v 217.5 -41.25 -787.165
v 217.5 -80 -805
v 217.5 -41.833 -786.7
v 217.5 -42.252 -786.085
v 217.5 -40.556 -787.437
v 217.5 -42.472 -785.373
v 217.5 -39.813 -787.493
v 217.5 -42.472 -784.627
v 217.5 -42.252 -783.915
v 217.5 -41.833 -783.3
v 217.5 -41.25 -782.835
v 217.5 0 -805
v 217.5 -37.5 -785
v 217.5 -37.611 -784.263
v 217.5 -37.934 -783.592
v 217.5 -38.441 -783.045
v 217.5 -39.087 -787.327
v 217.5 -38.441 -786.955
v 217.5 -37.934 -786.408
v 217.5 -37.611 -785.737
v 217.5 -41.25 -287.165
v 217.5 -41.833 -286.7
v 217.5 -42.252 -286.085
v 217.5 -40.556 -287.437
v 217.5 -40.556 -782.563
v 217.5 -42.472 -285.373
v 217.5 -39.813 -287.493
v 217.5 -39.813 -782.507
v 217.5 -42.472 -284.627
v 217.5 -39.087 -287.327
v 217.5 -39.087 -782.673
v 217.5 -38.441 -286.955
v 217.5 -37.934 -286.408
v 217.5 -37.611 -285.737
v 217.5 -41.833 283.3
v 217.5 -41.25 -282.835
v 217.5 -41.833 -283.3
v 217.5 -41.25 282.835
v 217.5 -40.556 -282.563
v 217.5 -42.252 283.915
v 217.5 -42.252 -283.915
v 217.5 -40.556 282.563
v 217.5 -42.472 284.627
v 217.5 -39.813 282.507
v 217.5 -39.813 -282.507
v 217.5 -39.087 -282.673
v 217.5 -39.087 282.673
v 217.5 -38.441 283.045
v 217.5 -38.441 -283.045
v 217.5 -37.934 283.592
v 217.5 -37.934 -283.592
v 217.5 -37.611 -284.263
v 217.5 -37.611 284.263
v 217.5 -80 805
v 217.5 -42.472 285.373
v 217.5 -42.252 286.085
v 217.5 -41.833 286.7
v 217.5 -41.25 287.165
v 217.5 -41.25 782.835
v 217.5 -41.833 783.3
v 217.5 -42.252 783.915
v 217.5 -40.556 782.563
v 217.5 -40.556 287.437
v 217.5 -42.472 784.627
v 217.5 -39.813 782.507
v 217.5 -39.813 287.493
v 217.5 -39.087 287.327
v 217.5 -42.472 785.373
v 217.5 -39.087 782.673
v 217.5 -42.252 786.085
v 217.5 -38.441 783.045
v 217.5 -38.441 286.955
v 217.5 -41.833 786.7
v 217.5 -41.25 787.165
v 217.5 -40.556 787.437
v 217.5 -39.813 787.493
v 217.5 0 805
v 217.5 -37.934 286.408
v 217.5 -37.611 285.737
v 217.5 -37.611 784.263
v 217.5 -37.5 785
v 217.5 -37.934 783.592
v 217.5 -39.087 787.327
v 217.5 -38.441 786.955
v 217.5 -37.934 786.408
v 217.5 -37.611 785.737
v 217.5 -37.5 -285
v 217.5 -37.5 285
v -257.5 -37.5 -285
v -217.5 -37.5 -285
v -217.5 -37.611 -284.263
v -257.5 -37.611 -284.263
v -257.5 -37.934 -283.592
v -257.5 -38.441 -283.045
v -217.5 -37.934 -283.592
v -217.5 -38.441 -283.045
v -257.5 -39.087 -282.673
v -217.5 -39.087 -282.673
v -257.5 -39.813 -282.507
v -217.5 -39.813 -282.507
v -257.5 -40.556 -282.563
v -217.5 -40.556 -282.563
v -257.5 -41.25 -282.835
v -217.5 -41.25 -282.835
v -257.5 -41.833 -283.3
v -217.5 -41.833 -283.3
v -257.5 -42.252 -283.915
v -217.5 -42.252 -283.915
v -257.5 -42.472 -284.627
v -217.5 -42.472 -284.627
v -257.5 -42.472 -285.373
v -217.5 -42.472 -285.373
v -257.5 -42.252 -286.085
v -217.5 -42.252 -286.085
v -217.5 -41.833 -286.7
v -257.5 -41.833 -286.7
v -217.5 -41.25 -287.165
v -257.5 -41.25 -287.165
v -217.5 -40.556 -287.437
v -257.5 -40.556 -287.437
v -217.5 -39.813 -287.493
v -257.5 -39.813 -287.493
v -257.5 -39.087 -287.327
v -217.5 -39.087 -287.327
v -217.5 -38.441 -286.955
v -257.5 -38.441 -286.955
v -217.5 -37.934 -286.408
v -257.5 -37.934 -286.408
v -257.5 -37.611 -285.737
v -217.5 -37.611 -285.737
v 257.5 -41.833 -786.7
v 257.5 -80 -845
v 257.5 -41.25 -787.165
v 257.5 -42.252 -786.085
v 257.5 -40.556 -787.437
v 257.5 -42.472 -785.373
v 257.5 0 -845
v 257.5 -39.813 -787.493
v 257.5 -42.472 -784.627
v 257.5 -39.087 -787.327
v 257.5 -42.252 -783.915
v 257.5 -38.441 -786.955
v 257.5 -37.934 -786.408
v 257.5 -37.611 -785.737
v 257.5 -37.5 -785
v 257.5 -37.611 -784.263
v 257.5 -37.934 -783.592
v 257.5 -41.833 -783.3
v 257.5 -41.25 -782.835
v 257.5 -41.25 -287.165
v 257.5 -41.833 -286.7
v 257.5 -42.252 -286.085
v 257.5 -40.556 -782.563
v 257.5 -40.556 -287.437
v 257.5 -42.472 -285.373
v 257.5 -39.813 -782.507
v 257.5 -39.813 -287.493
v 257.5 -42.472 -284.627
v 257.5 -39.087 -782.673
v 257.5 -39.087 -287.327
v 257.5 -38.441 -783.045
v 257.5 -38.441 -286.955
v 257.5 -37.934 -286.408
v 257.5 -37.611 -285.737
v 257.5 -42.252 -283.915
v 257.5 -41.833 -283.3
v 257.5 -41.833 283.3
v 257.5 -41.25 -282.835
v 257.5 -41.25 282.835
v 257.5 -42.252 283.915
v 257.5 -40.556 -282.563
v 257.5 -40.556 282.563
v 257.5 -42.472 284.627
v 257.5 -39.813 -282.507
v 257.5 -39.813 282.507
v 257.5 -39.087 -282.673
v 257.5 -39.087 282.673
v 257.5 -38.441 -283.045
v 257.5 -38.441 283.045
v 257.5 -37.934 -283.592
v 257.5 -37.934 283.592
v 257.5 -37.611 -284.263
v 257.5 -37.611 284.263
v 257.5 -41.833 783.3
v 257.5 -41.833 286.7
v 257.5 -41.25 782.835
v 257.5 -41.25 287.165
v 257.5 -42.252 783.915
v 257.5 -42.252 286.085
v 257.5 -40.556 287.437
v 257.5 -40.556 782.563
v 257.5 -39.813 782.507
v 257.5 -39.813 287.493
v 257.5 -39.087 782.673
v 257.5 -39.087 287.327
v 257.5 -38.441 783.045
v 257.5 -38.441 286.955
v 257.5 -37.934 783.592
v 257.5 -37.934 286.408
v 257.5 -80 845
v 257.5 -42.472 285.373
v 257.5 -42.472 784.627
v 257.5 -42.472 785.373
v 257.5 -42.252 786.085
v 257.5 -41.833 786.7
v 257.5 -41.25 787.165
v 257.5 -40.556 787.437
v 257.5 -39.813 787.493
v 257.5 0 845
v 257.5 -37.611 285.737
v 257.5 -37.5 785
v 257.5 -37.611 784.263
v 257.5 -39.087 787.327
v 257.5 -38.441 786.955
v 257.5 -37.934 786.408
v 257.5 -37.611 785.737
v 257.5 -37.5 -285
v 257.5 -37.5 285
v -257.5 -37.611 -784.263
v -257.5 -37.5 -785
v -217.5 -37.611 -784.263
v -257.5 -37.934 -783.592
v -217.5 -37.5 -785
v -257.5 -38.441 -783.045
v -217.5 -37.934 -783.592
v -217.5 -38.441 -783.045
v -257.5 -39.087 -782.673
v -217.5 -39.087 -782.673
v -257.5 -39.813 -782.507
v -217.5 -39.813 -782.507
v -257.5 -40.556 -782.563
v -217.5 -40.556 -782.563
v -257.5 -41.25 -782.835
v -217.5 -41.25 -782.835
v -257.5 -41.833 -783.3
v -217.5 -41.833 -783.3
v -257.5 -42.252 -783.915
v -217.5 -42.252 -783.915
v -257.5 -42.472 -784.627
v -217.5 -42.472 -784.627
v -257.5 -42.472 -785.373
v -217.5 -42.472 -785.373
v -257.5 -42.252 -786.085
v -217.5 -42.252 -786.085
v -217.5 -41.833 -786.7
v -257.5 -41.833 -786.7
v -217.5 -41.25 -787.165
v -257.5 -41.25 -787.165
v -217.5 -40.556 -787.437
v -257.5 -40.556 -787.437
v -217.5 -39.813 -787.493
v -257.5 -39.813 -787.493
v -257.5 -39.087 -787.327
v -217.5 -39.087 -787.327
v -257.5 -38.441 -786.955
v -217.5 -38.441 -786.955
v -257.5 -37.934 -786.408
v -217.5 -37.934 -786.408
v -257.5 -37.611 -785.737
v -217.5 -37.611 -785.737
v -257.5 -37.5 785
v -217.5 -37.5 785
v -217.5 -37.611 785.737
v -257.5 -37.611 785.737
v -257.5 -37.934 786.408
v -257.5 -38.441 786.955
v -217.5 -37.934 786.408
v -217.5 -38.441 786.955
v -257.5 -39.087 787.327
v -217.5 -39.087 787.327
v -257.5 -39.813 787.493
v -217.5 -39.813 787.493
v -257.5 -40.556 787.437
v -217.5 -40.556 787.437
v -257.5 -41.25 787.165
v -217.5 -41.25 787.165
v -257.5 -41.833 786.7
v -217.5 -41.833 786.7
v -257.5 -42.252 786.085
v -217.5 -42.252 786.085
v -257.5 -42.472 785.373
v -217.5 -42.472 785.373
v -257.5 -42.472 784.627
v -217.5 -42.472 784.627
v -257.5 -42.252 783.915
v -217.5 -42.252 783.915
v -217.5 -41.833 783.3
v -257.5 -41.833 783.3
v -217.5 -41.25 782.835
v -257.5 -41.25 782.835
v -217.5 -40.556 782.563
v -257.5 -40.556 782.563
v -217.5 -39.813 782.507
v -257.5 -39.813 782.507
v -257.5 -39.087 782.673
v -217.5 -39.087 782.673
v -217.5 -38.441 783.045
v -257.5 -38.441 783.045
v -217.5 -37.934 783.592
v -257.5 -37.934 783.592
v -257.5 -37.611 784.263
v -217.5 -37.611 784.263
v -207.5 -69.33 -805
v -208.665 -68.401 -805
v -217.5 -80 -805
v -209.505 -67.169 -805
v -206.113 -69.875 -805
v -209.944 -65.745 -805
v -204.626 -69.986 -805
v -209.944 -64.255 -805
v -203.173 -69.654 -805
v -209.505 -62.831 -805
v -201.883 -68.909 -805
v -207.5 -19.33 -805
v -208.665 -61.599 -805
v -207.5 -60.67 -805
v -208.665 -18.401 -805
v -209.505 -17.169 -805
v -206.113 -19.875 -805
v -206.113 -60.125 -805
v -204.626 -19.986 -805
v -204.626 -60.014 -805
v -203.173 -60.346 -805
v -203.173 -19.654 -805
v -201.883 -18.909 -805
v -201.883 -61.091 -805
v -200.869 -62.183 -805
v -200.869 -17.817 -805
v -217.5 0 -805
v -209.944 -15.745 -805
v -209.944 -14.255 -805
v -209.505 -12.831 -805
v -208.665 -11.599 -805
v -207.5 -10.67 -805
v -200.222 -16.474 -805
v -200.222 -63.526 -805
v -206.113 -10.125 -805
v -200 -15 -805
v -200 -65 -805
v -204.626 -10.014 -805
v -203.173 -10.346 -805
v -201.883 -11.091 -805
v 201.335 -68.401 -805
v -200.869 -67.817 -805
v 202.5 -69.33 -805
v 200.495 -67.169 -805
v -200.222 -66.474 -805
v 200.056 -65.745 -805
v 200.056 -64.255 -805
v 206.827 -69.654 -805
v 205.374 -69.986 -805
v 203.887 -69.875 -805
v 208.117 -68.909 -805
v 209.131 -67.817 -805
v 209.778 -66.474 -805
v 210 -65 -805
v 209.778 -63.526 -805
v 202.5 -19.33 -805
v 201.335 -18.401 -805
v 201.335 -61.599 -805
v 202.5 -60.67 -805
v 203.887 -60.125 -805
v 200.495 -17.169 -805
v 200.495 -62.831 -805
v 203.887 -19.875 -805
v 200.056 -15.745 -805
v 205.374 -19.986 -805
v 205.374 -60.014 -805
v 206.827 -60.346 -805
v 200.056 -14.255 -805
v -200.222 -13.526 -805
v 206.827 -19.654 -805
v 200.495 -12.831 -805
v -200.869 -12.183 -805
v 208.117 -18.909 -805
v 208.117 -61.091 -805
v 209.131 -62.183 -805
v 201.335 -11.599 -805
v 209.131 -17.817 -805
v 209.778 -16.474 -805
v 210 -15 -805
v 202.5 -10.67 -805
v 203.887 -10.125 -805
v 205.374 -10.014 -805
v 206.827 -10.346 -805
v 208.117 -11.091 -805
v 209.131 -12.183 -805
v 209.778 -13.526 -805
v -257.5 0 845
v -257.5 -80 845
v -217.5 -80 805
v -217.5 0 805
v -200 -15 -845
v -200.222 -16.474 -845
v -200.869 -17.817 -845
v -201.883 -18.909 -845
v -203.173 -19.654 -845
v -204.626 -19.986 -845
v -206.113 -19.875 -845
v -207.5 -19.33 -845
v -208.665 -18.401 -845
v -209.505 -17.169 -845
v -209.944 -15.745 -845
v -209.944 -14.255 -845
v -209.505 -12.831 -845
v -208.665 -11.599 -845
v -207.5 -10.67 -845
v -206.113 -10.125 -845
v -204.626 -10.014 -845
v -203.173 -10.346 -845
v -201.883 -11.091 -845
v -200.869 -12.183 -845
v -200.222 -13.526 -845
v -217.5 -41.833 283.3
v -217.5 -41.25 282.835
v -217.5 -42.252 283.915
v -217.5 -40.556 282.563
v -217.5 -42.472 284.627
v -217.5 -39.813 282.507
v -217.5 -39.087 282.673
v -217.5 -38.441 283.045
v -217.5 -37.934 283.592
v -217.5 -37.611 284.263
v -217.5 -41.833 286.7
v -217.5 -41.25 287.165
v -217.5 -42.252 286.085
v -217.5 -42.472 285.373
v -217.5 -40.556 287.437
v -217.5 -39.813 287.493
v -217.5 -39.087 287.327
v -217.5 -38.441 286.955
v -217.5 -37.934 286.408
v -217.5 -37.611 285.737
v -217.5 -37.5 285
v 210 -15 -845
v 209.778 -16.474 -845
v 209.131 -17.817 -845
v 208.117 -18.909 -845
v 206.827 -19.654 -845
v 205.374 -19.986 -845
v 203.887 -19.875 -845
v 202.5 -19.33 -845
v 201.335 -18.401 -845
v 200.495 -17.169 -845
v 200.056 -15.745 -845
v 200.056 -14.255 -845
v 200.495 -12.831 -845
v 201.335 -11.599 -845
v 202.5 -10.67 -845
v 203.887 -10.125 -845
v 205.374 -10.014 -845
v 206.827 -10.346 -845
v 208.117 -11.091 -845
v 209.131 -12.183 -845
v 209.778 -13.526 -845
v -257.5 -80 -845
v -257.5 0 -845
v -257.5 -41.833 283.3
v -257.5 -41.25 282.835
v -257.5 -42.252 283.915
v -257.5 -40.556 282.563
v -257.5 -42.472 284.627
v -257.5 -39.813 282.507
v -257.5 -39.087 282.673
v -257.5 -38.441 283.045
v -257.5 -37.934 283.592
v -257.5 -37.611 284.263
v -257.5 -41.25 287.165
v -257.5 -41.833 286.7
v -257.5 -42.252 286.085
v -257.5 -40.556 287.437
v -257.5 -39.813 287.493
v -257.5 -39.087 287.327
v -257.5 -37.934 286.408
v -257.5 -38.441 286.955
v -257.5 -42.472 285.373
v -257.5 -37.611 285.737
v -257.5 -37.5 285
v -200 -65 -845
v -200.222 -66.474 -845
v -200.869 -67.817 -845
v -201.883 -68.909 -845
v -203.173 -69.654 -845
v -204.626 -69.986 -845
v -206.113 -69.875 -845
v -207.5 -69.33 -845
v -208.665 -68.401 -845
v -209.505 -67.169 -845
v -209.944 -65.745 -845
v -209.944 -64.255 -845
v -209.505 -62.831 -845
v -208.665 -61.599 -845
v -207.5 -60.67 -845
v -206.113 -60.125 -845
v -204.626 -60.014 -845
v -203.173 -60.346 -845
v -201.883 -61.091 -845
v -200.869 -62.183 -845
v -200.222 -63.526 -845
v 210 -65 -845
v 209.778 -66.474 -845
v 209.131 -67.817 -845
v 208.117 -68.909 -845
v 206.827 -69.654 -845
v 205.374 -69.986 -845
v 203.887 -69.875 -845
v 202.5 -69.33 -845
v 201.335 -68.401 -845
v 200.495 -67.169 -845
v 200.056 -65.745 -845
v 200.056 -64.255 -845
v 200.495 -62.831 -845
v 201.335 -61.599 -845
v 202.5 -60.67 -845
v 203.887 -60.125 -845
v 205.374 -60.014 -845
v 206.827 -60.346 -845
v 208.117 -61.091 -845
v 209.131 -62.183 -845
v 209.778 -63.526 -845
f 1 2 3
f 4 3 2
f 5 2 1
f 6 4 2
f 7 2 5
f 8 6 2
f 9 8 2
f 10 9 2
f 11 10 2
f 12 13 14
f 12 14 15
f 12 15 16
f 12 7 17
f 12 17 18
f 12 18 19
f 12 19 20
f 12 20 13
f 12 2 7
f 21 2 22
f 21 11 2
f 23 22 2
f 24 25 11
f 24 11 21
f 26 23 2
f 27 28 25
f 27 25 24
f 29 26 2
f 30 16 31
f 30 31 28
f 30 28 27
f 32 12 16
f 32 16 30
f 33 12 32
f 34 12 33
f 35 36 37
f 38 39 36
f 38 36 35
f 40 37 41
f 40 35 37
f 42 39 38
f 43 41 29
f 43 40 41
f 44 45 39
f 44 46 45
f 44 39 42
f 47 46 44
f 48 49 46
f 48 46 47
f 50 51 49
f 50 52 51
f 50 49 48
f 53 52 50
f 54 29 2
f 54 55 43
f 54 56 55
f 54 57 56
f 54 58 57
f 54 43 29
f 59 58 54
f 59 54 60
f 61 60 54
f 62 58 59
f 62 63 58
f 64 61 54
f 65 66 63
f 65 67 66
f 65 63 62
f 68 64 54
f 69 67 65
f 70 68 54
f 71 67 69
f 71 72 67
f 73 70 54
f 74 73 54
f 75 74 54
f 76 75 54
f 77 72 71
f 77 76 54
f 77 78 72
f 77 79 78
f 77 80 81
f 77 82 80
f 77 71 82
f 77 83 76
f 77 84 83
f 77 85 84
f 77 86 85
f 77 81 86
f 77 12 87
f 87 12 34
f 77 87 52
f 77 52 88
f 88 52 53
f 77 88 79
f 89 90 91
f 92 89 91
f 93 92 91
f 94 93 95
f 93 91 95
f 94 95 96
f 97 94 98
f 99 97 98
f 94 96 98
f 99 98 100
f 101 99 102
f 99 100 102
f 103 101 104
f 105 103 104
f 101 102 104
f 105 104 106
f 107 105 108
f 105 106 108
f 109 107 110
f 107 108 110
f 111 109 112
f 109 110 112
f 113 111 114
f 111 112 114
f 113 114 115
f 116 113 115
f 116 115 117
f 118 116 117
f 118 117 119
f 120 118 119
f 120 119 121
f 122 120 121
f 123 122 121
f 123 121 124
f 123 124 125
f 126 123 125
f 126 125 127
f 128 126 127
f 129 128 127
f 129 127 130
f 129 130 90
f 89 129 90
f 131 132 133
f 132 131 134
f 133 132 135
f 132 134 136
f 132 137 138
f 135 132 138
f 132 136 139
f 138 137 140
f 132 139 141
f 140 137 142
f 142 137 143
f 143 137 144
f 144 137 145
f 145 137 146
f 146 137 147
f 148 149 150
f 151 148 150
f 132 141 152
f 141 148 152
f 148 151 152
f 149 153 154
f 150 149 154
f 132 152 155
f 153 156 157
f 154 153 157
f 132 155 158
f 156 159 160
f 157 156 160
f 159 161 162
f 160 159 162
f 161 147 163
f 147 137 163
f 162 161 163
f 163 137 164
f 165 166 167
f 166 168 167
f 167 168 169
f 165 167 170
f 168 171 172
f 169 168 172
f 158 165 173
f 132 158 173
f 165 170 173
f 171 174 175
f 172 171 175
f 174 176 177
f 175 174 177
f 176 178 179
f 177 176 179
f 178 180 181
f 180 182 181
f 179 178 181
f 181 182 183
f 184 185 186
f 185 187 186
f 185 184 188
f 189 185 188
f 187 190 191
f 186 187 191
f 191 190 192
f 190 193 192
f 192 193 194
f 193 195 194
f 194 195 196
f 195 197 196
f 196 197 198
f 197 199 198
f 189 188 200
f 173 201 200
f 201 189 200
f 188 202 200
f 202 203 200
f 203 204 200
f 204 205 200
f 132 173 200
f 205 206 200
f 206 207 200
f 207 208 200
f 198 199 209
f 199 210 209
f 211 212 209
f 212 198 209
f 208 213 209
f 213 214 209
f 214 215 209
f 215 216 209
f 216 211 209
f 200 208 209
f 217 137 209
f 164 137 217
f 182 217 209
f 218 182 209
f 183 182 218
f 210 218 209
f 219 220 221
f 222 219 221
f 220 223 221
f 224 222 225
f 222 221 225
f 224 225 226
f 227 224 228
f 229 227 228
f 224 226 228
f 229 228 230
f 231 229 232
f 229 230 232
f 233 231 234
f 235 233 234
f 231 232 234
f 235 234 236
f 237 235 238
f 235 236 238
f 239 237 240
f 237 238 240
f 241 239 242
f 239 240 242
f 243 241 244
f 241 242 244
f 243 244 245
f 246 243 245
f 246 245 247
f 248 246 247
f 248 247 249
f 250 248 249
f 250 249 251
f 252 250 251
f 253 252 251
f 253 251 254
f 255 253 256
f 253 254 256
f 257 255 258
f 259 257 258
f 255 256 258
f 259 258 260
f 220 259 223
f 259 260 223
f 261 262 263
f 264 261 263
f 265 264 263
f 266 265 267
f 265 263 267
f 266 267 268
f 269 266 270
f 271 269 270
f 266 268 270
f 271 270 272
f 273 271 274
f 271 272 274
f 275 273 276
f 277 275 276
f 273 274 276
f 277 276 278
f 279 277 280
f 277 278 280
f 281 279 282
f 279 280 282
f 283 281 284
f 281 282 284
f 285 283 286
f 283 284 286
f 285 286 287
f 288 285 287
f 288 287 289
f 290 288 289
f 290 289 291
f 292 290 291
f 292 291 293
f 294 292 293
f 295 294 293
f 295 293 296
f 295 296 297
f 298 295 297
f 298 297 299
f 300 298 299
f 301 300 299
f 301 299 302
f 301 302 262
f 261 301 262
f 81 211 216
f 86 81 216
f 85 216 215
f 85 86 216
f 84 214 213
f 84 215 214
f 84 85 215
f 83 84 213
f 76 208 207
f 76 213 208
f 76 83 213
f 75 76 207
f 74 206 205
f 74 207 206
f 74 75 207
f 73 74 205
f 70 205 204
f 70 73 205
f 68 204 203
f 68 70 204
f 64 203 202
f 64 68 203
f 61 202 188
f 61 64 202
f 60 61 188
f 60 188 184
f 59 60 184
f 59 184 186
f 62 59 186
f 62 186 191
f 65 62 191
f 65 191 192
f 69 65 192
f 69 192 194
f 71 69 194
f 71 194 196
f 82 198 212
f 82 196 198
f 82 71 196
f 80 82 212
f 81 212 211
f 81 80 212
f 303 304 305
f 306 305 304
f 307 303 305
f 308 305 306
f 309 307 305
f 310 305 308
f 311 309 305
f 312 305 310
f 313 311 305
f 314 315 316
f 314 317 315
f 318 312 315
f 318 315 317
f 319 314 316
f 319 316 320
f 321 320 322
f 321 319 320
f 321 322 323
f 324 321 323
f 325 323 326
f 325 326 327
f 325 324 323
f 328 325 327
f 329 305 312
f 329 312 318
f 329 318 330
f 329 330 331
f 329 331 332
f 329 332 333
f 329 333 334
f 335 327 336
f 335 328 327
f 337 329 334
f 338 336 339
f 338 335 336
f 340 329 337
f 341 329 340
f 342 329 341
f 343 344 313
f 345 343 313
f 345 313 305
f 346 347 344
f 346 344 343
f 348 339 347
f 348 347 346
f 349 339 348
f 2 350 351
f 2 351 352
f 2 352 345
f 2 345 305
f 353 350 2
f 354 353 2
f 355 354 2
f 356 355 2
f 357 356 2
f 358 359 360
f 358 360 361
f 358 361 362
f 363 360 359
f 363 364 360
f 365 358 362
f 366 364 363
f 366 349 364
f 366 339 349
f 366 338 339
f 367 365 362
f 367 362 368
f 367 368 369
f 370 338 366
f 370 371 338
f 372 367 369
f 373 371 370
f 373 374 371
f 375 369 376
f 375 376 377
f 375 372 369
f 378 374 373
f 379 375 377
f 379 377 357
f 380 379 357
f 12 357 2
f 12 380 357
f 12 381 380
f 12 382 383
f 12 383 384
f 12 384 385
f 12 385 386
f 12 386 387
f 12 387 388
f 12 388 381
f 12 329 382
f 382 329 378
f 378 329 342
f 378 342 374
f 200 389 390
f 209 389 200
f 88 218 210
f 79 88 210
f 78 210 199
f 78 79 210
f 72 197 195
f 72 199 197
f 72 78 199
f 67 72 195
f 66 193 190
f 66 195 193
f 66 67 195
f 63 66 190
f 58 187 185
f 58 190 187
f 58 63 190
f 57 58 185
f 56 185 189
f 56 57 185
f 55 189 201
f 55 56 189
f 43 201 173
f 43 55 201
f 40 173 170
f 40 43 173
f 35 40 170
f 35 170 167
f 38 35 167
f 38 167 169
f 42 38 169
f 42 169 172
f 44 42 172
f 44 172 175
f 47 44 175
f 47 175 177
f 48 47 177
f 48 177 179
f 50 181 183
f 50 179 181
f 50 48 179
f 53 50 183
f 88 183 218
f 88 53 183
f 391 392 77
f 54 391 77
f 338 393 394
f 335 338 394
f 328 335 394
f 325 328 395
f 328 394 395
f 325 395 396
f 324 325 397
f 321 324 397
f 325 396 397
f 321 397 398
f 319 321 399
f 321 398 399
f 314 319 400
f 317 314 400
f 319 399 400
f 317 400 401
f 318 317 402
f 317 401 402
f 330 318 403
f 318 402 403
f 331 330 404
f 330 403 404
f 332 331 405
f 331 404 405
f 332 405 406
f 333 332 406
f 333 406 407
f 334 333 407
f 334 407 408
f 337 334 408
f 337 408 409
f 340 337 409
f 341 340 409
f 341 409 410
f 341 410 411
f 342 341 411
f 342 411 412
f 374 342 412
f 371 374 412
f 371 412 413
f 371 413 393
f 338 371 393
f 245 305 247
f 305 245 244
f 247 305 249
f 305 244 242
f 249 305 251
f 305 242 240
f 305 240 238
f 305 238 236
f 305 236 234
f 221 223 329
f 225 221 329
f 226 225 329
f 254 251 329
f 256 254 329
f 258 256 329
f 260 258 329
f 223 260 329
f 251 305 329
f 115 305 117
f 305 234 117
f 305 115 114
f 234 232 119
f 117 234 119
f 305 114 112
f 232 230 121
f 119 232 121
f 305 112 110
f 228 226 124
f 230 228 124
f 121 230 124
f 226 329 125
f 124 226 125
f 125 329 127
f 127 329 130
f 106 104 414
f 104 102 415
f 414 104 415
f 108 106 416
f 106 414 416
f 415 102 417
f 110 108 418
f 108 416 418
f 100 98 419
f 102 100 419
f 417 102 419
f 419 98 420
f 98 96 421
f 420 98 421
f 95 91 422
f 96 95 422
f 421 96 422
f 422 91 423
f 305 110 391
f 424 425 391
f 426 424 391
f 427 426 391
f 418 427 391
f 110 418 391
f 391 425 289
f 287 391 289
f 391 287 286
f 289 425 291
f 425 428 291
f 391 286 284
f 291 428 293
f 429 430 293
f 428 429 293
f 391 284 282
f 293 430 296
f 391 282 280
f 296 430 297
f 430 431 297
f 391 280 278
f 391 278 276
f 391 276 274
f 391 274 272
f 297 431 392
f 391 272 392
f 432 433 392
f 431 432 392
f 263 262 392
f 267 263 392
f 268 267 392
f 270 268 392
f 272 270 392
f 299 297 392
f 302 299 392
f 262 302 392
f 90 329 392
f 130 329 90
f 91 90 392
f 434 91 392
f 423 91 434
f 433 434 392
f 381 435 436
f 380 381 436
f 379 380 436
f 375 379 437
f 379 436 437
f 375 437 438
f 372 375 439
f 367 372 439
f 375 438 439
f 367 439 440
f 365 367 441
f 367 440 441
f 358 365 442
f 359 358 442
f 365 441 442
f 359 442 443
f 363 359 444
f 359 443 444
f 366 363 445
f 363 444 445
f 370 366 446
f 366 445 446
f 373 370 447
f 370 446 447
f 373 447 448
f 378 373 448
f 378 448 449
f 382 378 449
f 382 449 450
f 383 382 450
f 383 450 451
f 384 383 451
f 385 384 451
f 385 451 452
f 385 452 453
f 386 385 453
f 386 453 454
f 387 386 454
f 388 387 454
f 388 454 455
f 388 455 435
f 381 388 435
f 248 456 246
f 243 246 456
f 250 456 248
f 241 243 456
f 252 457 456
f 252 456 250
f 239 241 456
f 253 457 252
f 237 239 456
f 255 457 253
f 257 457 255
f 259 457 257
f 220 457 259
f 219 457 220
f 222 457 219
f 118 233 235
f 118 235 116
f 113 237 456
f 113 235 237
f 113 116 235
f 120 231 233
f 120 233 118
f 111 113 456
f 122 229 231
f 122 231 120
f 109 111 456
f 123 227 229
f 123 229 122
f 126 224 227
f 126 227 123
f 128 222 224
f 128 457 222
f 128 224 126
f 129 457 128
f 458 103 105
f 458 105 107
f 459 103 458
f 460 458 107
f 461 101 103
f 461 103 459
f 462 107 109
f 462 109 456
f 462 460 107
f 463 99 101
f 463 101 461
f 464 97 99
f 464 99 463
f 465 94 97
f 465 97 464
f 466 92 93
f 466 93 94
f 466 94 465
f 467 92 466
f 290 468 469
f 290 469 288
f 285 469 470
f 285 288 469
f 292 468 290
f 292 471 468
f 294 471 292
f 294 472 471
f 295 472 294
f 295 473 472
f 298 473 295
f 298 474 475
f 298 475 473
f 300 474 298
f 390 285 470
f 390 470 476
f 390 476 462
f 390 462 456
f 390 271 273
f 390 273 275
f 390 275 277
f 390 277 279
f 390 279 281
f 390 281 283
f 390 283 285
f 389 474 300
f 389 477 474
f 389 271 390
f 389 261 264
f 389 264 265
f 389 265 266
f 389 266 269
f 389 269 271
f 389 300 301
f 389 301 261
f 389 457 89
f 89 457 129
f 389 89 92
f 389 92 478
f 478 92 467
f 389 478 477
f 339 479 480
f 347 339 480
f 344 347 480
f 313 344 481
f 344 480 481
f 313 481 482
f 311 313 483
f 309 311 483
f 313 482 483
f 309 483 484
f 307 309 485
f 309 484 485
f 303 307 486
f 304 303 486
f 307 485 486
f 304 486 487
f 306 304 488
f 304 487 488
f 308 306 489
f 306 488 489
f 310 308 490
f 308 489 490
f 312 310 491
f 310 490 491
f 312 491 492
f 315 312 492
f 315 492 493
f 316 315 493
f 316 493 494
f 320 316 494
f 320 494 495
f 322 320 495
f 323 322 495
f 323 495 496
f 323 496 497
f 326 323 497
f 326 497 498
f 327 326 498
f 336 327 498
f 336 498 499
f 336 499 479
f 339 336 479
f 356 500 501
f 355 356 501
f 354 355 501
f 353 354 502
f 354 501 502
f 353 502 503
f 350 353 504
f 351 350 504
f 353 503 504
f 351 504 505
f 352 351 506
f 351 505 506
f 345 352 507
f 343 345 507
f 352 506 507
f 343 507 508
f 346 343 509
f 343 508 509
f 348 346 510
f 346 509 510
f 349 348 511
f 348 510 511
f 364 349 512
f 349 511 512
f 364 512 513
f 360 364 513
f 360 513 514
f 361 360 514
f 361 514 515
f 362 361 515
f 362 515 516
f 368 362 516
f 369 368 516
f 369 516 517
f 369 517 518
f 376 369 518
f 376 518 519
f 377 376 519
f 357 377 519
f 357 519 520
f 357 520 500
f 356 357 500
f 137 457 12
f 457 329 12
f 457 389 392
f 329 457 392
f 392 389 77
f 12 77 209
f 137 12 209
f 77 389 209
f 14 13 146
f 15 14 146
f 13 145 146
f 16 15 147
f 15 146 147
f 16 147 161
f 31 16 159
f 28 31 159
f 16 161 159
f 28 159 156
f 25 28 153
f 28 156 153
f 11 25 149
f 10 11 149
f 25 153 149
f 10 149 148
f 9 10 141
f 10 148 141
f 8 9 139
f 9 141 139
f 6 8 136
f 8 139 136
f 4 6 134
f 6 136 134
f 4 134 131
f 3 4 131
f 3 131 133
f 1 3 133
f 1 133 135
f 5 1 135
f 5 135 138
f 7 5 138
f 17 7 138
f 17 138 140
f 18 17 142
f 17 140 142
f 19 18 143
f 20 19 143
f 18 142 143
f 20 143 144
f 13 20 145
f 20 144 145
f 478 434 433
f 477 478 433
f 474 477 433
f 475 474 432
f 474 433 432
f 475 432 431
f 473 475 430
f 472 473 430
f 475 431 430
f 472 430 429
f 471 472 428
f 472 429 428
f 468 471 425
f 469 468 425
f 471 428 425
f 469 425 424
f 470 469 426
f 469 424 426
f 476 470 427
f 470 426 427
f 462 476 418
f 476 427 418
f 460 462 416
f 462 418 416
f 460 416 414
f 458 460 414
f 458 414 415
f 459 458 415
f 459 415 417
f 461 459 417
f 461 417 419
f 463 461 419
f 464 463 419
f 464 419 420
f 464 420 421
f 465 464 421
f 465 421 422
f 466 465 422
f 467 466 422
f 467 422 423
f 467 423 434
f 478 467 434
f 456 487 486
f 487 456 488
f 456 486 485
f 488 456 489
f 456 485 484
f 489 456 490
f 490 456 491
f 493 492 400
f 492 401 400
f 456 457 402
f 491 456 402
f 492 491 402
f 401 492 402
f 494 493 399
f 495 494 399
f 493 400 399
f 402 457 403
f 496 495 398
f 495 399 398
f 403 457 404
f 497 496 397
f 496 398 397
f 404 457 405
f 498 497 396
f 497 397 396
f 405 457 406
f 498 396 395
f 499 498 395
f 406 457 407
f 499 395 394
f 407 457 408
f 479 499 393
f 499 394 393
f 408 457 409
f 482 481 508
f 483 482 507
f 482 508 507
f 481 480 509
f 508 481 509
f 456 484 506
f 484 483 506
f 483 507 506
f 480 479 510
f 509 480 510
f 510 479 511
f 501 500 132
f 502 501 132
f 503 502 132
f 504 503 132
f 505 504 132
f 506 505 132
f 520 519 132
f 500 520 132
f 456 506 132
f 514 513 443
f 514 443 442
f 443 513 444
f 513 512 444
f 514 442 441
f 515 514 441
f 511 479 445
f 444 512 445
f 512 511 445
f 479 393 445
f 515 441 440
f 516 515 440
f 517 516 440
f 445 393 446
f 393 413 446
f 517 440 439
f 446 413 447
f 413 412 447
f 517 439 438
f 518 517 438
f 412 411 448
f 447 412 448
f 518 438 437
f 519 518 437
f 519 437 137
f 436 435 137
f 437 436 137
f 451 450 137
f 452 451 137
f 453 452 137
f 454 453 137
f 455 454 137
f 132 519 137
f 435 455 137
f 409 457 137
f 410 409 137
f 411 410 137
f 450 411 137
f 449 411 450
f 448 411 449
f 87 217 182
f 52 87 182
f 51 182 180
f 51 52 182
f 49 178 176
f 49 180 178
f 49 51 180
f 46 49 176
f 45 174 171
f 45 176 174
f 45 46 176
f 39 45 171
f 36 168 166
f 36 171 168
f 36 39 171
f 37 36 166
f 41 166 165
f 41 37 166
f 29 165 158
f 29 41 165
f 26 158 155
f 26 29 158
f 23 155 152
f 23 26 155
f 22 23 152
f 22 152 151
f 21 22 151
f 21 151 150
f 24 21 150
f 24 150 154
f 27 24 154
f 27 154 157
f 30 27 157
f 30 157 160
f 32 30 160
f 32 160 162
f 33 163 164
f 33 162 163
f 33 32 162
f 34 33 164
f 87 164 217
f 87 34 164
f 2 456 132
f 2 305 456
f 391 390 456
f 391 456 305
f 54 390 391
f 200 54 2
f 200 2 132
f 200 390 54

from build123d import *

# Parameters (mm, degrees)
F0_W     = 515
F0_H     = 1690
F0_W_2   = 435
F0_H_2   = 1610
F1_DEPTH = 80
F2_R     = 5
F3_DEPTH = 100
F4_R     = 2.5
F5_DEPTH = 1000


with BuildPart() as f1:
    # F0 (on Front) → F1 (new body)
    with BuildSketch(Plane.XZ):
        Rectangle(F0_W, F0_H)
        Rectangle(F0_W_2, F0_H_2, mode=Mode.SUBTRACT)
    extrude(amount=F1_DEPTH)

    # F2 (on face) → F3 (cut)
    with BuildSketch(Plane(origin=(0, 0, -845), x_dir=(1, 0, 0), z_dir=(0, 0, -1))):
        with Locations((-205, 65)):
            Circle(F2_R)
        with Locations((-205, 15)):
            Circle(F2_R)
        with Locations((205, 65)):
            Circle(F2_R)
        with Locations((205, 15)):
            Circle(F2_R)
    extrude(amount=-F3_DEPTH, mode=Mode.SUBTRACT)

    # F4 (on Right) → F5 (cut, symmetric)
    with BuildSketch(Plane.YZ):
        with Locations((-40, 285)):
            Circle(F4_R)
        with Locations((-40, 785)):
            Circle(F4_R)
        with Locations((-40, -285)):
            Circle(F4_R)
        with Locations((-40, -785)):
            Circle(F4_R)
    extrude(amount=F5_DEPTH, both=True, mode=Mode.SUBTRACT)


solid = f1.part
